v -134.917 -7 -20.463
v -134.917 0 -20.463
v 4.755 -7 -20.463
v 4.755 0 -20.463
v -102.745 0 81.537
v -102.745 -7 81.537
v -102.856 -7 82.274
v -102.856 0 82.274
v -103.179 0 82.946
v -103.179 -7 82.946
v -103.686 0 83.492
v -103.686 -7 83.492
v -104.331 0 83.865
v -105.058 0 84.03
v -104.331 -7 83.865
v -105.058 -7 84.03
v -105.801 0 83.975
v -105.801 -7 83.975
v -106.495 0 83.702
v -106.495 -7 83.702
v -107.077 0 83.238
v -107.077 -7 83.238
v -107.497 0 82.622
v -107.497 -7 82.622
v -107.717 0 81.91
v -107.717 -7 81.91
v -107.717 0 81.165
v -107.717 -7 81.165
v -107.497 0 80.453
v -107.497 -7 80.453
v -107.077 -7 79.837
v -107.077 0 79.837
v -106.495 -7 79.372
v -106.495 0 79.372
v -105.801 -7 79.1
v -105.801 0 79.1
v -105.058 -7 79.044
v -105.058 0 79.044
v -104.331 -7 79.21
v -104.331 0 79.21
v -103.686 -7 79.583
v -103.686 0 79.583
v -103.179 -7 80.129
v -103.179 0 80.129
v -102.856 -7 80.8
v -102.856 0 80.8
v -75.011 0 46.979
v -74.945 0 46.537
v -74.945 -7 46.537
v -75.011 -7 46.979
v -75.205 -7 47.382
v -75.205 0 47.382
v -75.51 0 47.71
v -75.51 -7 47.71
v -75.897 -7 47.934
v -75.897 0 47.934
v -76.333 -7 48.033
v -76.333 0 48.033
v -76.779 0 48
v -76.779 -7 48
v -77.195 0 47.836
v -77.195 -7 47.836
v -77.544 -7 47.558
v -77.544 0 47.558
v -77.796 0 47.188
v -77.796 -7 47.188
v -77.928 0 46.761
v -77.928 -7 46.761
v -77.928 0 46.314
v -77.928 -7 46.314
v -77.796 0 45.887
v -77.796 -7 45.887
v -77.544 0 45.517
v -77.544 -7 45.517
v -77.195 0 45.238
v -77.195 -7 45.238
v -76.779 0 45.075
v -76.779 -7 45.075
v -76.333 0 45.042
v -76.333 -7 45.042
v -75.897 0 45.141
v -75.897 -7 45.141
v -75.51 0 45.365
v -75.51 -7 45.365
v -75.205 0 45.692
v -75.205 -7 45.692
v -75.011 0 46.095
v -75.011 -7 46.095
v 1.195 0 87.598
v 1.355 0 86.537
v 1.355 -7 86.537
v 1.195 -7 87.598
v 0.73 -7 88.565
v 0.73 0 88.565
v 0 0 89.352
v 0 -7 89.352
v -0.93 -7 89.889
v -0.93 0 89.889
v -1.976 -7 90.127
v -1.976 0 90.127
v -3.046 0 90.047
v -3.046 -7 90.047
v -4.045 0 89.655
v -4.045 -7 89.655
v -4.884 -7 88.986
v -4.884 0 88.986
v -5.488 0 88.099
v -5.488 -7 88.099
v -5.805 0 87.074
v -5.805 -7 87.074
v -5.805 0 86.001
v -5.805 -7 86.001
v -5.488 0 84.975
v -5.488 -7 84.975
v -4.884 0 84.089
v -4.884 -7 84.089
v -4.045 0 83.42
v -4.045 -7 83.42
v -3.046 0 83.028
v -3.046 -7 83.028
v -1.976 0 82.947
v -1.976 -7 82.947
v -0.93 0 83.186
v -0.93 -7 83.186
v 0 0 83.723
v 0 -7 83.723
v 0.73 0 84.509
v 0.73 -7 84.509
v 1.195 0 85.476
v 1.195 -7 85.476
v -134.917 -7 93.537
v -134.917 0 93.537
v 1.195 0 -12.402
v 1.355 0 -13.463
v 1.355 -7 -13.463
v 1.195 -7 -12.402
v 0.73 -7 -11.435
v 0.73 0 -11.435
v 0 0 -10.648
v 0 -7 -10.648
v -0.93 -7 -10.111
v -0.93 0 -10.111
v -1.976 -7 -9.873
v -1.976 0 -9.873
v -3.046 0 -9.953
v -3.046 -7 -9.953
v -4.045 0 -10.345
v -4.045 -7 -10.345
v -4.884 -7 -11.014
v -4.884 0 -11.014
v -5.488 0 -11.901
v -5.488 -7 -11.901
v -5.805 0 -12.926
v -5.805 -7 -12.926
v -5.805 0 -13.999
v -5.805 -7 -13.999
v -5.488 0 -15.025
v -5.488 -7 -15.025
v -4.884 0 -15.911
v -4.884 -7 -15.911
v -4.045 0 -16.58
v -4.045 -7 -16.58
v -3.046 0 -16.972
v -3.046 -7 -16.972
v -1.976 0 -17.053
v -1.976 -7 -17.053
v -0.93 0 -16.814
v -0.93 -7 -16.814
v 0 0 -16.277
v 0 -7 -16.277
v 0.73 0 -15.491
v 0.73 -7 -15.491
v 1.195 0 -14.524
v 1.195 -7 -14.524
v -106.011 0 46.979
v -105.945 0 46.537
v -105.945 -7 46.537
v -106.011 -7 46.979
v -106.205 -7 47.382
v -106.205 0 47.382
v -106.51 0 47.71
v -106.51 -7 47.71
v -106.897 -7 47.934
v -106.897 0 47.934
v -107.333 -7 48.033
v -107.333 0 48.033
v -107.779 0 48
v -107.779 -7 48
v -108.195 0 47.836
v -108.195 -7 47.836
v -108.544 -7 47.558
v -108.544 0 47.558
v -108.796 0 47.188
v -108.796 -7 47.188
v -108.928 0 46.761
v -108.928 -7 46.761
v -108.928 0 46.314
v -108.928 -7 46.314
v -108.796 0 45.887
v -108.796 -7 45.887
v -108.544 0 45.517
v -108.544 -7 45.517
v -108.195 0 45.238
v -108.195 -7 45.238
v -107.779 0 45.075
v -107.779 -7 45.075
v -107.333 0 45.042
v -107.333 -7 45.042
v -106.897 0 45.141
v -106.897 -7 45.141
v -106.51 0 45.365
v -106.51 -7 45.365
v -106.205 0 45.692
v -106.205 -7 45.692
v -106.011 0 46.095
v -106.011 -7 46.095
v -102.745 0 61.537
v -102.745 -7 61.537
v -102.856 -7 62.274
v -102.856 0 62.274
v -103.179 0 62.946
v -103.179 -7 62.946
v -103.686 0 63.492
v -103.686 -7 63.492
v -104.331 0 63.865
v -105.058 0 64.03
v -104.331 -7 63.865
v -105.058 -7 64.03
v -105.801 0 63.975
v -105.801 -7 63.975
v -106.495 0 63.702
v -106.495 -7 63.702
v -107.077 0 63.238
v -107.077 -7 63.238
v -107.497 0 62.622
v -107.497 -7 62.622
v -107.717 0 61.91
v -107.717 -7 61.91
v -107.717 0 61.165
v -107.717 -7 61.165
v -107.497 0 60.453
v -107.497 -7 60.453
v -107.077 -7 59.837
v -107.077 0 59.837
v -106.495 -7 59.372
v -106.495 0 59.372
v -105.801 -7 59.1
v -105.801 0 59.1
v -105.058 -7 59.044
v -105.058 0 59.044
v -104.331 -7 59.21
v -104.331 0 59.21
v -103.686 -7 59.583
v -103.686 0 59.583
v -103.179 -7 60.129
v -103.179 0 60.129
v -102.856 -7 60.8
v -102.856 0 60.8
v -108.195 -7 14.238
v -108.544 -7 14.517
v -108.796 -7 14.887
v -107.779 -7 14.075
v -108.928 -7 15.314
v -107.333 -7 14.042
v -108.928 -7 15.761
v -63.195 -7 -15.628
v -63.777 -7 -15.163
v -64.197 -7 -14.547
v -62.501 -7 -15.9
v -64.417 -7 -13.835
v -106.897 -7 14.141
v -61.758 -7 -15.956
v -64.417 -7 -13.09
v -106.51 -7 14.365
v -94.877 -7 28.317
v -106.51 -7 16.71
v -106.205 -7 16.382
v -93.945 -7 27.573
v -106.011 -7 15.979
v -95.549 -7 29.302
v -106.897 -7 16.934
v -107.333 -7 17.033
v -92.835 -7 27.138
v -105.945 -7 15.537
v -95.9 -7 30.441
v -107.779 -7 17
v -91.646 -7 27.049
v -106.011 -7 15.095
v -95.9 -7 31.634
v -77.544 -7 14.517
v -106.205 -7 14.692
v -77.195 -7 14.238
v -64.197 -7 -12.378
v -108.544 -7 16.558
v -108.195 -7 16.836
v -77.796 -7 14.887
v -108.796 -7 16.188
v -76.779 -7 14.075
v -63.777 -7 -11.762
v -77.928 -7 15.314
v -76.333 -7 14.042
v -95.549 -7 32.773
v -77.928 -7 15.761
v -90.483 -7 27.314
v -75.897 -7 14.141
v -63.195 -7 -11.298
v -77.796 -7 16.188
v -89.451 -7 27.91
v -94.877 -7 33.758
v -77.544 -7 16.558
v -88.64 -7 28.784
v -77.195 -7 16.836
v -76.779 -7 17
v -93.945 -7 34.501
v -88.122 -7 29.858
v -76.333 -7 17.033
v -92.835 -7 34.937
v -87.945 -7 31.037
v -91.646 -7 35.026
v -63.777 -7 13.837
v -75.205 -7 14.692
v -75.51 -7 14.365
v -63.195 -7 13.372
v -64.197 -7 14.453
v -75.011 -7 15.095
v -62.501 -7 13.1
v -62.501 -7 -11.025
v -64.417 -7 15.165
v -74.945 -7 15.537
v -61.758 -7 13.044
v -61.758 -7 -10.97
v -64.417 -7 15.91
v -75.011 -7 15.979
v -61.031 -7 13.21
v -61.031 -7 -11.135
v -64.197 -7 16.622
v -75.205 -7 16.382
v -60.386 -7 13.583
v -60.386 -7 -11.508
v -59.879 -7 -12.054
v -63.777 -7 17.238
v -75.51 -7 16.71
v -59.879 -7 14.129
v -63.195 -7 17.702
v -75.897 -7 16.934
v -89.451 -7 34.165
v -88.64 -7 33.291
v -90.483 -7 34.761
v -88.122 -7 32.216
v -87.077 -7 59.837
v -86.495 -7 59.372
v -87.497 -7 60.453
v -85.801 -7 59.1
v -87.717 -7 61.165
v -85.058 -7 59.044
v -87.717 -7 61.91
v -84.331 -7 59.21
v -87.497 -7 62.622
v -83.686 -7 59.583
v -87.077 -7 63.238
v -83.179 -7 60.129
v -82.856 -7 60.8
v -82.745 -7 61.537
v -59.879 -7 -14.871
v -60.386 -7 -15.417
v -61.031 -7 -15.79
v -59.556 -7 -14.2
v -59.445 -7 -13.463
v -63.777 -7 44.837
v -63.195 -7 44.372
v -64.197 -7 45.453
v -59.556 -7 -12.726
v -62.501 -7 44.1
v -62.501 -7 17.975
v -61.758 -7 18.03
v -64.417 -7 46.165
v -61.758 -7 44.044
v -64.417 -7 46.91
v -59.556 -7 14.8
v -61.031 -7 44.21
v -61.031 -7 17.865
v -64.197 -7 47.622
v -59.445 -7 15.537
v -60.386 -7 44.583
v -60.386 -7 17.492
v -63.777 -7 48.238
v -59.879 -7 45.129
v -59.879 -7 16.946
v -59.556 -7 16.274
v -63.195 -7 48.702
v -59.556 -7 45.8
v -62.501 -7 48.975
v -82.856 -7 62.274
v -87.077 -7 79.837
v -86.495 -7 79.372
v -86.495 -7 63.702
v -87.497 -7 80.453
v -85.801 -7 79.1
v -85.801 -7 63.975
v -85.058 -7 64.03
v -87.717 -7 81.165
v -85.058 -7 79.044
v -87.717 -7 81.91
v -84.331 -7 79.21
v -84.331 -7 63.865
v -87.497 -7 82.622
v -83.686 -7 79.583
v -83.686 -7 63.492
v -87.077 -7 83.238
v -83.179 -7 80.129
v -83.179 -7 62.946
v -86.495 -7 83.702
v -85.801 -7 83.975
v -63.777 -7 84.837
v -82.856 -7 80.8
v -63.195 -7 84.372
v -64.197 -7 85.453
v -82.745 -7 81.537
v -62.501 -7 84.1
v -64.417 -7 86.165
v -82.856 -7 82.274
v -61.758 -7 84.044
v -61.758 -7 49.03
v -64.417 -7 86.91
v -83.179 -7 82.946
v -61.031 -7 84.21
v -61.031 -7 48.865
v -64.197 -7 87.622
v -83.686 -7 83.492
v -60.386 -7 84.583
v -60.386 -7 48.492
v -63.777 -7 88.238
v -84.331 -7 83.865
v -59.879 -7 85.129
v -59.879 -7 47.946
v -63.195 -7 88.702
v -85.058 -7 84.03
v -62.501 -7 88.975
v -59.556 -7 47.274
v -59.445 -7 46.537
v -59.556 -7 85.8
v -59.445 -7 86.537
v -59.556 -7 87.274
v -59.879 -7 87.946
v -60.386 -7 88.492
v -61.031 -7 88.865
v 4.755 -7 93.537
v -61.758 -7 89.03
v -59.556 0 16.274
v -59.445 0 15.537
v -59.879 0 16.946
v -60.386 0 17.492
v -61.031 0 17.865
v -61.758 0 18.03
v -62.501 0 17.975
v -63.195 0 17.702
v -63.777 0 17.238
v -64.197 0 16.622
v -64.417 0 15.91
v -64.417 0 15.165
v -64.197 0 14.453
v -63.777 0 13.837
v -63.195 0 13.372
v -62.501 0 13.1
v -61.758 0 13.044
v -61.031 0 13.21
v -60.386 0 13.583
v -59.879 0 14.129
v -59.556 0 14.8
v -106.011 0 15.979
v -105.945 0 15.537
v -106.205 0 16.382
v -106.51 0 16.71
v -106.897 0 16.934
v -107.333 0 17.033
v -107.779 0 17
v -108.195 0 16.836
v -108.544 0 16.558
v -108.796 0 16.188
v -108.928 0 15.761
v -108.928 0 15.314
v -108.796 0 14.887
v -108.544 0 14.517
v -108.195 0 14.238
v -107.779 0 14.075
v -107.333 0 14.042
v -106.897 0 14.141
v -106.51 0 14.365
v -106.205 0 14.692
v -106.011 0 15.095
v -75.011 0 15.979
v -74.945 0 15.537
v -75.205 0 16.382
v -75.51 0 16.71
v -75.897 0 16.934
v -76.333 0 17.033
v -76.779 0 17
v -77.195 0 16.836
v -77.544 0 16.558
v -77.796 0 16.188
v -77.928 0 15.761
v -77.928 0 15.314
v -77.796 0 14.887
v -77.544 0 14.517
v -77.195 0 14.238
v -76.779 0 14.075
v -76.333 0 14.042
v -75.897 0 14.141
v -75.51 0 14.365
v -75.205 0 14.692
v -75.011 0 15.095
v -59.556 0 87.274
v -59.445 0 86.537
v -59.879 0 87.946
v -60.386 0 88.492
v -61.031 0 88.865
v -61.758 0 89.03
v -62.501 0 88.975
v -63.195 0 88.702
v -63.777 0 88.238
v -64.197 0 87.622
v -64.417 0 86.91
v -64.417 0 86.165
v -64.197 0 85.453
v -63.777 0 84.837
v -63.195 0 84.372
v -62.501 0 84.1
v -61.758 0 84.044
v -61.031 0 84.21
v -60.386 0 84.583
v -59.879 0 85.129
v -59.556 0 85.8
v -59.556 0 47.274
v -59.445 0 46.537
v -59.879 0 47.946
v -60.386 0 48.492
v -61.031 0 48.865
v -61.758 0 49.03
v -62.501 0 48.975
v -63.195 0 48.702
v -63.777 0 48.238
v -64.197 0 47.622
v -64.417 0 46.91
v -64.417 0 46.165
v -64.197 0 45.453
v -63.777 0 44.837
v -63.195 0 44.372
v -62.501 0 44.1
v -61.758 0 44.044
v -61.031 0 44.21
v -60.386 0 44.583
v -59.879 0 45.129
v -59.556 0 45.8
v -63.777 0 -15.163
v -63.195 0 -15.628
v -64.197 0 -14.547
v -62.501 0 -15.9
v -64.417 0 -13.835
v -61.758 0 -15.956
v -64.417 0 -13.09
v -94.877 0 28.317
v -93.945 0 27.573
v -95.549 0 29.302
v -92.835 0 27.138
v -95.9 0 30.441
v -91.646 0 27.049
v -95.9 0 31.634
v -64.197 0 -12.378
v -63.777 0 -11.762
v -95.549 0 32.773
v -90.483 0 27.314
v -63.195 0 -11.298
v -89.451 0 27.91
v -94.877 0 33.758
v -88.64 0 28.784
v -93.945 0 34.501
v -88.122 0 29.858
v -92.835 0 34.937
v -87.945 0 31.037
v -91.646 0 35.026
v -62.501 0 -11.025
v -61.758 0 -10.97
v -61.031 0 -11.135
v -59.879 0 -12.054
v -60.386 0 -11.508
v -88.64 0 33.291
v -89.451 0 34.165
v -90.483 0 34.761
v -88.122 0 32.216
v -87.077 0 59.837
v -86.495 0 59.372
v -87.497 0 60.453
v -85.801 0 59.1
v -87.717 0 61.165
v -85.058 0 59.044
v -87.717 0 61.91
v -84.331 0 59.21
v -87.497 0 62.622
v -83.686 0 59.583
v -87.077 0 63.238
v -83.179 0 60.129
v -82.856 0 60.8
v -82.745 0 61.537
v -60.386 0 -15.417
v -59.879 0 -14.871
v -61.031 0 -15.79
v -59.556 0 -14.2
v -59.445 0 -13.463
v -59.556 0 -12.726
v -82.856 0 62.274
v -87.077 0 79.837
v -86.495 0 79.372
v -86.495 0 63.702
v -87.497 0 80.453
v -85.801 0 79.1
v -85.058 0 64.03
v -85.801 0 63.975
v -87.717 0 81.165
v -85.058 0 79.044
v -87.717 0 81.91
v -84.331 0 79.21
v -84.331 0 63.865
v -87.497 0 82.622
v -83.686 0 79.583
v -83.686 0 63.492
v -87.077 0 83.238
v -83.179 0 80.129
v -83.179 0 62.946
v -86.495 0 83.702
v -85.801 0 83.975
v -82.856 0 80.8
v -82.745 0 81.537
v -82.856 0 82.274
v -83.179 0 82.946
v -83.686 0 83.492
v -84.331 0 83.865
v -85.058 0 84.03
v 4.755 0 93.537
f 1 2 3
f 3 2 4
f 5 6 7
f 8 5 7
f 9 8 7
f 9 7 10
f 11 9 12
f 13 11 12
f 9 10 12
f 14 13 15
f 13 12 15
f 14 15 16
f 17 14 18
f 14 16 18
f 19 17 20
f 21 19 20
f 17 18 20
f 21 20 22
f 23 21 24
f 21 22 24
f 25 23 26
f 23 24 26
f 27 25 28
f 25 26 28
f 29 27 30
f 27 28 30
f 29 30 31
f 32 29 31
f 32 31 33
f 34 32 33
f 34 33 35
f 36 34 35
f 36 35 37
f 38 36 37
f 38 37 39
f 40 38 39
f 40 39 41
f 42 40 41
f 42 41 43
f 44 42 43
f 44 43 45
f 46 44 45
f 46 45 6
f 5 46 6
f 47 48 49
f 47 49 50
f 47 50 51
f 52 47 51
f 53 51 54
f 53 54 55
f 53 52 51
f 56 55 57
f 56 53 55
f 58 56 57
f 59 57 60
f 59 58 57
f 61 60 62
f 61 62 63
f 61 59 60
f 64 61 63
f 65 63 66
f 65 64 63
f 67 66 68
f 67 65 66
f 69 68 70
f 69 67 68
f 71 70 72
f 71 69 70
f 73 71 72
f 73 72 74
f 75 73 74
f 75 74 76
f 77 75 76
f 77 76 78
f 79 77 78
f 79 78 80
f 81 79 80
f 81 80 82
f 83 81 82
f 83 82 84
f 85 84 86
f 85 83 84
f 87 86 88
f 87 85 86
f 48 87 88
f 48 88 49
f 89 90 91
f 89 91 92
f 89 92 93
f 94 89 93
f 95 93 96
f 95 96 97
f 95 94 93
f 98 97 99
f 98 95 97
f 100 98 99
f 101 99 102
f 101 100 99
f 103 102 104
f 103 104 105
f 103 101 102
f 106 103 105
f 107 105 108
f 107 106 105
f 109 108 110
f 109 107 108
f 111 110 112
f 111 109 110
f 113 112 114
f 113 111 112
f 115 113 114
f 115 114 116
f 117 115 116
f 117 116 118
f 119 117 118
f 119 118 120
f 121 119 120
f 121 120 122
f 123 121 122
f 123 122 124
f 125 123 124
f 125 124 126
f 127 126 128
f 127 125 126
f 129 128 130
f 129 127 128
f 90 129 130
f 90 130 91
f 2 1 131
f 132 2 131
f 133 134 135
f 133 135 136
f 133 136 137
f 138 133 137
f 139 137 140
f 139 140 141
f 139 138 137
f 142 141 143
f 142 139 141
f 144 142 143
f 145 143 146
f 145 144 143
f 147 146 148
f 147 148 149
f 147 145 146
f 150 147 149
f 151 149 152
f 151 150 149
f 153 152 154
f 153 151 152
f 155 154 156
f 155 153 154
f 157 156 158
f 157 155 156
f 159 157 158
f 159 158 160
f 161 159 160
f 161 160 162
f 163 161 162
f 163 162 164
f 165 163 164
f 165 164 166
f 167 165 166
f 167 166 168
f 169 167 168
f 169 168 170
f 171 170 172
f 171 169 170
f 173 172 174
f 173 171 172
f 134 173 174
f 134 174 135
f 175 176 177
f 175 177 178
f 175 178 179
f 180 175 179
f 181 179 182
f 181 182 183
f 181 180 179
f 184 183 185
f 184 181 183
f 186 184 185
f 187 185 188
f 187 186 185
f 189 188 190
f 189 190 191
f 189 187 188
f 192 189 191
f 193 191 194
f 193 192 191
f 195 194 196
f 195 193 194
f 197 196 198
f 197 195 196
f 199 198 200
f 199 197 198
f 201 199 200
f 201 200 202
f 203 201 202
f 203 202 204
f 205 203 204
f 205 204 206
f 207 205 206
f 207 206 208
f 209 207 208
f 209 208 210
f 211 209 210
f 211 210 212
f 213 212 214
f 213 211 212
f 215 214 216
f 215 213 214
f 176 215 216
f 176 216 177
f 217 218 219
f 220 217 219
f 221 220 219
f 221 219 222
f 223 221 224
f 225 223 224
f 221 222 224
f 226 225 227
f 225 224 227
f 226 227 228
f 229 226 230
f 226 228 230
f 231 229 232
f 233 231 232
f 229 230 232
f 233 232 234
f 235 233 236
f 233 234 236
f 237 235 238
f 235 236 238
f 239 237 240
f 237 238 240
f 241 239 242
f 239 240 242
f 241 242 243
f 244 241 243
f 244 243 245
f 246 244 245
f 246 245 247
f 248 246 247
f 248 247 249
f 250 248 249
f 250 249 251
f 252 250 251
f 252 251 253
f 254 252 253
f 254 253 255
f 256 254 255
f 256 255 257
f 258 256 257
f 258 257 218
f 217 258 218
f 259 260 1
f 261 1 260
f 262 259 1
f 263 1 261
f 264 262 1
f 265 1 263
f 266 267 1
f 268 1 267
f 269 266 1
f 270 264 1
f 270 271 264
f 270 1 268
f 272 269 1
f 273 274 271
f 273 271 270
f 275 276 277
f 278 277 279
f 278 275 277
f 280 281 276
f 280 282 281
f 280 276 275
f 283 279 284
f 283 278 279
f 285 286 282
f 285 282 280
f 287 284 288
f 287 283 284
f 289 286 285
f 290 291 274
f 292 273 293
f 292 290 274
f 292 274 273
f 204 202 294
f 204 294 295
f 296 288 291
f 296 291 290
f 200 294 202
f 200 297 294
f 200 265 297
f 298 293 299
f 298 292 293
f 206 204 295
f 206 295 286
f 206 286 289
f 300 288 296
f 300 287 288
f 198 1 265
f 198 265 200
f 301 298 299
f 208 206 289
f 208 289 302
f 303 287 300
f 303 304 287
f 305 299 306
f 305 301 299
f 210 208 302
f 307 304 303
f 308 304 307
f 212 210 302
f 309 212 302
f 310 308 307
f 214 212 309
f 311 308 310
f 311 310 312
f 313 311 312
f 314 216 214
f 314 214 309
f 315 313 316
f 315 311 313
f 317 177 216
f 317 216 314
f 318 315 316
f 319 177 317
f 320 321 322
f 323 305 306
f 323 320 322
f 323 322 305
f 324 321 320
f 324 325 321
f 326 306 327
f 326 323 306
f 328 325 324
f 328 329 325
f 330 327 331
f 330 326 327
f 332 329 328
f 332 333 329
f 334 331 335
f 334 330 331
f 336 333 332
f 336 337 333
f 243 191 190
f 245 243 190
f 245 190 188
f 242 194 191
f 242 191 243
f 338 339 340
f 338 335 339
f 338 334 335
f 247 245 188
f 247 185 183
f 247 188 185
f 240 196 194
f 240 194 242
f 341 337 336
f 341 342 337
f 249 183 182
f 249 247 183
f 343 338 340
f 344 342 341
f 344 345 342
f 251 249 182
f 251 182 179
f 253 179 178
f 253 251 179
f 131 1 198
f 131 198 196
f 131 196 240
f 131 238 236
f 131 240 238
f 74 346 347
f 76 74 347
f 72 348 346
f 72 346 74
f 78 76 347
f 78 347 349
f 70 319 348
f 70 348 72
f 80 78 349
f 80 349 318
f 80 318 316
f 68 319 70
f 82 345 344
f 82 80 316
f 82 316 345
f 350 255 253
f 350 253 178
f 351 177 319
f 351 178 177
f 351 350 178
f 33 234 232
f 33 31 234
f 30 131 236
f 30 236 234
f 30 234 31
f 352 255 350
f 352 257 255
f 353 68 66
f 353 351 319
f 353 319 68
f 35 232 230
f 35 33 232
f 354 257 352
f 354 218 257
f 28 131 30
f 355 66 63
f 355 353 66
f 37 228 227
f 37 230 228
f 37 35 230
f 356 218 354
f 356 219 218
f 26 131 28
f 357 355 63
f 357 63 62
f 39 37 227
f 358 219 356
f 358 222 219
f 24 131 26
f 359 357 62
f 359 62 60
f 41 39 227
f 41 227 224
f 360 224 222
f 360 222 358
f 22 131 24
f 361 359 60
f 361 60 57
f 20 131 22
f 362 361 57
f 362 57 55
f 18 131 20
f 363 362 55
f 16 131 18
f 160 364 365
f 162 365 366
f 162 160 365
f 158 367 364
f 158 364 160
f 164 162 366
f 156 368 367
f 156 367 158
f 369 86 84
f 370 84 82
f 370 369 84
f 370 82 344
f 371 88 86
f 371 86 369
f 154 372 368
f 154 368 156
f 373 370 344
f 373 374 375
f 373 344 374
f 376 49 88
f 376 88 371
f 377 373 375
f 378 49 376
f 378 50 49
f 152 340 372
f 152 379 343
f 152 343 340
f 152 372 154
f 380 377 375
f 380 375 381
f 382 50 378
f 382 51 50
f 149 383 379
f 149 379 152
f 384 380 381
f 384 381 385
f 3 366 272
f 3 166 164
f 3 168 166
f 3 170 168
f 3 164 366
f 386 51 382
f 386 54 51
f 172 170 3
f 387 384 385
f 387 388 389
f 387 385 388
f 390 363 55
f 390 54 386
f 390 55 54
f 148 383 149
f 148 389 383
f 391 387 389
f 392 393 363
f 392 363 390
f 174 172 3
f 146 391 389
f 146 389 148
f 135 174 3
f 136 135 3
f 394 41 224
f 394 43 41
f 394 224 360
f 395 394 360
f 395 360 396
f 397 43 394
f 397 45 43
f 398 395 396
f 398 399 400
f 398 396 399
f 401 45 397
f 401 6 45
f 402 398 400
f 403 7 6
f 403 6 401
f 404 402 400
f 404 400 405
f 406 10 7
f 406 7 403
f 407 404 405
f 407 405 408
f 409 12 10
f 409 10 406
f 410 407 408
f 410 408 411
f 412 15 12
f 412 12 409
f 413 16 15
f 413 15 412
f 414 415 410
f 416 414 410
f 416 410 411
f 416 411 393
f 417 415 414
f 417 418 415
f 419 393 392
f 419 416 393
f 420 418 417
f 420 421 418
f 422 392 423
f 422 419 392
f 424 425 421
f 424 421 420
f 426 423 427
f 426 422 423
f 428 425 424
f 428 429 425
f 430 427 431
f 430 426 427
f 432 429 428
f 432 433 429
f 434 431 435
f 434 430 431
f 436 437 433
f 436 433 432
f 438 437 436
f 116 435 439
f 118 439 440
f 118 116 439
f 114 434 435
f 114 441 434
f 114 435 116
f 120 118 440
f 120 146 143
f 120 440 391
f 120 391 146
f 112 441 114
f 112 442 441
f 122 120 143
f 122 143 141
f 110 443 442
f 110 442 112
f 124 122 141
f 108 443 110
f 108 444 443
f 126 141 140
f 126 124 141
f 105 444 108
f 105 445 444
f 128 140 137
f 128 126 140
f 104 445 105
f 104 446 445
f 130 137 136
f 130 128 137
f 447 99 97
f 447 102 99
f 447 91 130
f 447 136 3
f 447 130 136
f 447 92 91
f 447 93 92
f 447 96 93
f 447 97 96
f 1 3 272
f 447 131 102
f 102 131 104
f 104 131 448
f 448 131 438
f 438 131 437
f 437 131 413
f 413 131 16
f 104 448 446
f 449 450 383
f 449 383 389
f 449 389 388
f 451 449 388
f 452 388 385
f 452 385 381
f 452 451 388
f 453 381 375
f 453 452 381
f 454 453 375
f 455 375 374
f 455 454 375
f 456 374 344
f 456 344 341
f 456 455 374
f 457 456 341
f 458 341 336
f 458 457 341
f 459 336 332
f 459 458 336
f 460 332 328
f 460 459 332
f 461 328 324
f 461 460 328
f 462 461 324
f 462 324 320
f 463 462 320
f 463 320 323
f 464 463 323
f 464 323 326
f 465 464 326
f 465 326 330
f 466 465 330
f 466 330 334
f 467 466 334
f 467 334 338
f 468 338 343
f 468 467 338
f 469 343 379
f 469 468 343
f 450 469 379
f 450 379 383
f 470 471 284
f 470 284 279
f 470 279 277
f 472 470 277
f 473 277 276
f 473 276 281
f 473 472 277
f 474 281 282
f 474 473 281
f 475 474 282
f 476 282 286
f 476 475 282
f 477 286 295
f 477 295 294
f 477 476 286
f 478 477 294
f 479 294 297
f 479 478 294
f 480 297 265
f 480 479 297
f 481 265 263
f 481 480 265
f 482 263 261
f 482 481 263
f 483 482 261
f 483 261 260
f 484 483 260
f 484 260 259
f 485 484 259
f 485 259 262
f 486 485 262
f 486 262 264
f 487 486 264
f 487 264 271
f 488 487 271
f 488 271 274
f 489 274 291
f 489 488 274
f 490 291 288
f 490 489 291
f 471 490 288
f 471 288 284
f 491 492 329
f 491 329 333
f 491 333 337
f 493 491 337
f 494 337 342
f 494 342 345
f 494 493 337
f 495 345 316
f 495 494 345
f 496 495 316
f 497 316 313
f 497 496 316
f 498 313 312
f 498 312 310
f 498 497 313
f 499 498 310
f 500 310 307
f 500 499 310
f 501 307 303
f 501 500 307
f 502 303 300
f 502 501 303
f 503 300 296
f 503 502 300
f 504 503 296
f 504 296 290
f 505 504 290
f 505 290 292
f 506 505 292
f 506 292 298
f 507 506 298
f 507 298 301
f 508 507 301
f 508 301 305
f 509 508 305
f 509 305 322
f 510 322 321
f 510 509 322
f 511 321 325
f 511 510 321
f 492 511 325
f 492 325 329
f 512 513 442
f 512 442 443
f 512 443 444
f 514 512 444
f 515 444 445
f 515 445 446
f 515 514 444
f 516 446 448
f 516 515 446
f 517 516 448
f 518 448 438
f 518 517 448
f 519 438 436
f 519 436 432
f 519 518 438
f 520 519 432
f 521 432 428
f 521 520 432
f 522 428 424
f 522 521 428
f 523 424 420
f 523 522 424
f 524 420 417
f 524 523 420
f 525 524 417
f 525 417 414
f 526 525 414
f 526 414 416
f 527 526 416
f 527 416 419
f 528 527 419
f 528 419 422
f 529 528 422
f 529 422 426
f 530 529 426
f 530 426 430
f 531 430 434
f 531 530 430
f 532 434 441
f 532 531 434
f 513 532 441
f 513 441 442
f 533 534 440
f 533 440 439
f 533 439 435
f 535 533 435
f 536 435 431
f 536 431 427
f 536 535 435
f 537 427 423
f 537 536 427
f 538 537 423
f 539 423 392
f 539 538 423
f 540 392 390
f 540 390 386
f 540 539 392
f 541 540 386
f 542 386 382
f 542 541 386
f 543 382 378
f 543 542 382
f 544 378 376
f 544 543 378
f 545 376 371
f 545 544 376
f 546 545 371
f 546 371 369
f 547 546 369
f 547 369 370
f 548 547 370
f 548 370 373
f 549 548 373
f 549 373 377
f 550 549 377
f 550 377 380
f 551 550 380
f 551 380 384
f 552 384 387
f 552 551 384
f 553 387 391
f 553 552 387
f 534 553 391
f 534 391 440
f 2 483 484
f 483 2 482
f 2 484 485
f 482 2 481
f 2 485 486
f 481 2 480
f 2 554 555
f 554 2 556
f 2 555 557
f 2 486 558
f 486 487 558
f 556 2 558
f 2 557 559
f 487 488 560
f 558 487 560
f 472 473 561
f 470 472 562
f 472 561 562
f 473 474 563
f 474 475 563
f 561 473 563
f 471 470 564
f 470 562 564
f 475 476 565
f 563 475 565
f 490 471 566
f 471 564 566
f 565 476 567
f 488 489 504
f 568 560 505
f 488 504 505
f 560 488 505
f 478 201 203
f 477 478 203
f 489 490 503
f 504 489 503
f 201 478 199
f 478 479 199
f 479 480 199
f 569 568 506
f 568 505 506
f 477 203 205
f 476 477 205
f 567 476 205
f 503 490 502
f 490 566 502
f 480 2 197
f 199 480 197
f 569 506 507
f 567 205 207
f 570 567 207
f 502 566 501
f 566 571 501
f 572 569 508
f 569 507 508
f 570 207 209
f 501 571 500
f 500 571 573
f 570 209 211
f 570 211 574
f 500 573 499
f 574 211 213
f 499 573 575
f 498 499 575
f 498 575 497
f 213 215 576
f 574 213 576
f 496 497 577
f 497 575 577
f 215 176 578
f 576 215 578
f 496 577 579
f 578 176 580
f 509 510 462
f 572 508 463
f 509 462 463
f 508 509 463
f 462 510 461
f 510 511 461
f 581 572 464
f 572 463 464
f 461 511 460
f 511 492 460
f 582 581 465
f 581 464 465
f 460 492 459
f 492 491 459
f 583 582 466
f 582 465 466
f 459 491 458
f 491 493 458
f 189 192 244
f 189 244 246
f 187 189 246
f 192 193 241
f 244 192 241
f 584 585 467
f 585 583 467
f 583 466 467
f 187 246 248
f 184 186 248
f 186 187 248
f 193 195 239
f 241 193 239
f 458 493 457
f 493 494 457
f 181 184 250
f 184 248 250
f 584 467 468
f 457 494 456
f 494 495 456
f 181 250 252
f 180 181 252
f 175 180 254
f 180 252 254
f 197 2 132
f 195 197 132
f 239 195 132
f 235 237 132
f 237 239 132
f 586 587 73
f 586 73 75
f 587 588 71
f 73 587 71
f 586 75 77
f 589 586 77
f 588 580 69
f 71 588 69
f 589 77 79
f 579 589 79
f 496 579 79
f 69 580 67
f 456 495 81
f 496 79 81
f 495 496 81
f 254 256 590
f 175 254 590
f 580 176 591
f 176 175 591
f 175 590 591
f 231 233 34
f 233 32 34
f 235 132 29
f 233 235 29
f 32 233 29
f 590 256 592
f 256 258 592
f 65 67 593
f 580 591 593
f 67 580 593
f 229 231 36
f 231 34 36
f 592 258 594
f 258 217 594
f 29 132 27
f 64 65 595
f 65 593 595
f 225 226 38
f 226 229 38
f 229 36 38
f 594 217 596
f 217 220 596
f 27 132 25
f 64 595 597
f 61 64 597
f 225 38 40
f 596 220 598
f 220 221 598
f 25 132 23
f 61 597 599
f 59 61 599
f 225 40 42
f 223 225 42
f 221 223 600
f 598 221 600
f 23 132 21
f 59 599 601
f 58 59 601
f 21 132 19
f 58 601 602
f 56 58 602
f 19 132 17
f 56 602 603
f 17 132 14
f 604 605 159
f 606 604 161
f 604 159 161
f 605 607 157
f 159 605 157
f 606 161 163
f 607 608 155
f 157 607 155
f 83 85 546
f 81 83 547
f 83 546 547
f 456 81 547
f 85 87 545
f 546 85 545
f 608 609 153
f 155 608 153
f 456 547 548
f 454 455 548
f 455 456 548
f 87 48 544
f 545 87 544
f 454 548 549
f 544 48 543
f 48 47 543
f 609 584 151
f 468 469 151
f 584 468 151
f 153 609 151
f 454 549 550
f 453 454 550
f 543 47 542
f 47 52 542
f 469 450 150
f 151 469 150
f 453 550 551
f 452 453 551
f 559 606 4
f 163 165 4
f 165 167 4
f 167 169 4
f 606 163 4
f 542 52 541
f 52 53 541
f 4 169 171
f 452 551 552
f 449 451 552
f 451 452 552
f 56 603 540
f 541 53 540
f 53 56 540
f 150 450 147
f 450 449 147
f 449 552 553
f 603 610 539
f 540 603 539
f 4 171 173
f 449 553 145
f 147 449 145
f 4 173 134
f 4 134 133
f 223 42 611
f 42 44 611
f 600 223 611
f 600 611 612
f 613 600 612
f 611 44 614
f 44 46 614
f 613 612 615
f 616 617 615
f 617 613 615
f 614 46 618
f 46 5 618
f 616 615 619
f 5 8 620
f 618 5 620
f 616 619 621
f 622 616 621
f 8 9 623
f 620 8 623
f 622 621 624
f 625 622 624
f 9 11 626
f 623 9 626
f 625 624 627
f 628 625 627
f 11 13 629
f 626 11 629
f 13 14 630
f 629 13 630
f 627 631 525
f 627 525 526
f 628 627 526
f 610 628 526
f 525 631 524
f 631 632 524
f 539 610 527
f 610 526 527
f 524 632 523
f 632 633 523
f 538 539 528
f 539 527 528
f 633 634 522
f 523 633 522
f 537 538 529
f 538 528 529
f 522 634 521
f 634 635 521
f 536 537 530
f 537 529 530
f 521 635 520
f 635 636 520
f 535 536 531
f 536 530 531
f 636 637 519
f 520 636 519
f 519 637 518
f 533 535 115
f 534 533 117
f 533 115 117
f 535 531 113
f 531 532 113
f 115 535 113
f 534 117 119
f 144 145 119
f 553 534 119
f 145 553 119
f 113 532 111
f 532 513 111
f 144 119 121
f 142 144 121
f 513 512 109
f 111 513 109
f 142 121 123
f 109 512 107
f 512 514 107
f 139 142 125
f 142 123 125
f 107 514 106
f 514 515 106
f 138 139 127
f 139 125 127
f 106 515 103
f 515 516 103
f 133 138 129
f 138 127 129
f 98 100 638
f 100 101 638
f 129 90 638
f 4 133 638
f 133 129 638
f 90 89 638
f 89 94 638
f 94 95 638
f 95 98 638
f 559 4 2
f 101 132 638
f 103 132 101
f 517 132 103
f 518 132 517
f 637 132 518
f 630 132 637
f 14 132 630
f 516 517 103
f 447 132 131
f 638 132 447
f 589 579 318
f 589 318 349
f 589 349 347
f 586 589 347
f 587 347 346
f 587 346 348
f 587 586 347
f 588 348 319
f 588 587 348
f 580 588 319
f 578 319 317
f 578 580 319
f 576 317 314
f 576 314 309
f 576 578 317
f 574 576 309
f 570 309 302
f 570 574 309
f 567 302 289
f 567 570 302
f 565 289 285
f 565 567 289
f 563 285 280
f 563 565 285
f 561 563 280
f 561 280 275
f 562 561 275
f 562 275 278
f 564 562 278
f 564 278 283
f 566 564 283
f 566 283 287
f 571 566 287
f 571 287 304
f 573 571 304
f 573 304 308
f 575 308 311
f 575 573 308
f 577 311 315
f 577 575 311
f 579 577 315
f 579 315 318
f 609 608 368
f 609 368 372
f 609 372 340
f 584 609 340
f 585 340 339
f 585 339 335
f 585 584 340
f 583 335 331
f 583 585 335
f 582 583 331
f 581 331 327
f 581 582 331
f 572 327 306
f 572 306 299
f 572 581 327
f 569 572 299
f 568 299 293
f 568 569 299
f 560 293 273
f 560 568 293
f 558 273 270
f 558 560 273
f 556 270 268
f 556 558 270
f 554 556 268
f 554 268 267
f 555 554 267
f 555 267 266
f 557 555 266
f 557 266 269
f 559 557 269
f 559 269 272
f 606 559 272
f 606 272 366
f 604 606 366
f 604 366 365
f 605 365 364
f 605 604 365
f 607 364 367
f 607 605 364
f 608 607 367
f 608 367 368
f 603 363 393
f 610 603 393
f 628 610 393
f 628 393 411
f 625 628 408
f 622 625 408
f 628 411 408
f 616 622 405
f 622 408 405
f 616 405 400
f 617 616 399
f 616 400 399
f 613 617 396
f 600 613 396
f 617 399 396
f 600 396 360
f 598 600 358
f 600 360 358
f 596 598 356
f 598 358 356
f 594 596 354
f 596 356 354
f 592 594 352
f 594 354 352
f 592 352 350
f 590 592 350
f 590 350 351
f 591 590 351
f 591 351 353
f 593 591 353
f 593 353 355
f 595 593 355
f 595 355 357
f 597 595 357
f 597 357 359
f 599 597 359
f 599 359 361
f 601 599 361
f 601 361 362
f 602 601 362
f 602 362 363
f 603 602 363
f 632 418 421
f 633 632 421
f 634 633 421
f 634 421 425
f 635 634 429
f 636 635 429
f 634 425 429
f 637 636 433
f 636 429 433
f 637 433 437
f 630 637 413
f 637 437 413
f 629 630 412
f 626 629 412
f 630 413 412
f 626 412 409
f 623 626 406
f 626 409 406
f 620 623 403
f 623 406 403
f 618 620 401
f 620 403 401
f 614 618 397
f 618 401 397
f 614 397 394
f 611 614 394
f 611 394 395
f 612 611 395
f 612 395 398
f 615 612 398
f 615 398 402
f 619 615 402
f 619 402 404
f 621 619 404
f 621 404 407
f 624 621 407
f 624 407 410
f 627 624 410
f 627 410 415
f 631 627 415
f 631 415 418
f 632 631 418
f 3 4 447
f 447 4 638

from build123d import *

# Parameters (mm, degrees)
F0_W     = 156.7
F0_H     = 114
F0_R     = 1.5
F0_R_2   = 11
F0_R_3   = 2.5
F0_R_4   = 3.6
F0_R_5   = 4
F1_DEPTH = 7
F2_R     = 2.5
F2_W     = 17.027749
F2_H     = 114
F3_DEPTH = 25


with BuildPart() as f1:
    # F0 (on Front) → F1 (new body)
    with BuildSketch(Plane.XZ):
        with Locations((-73.594777, 36.537357)):
            Rectangle(F0_W, F0_H)
        with Locations((-107.444777, 15.537357)):
            Circle(F0_R, mode=Mode.SUBTRACT)
        with Locations((-76.444777, 15.537357)):
            Circle(F0_R, mode=Mode.SUBTRACT)
        with Locations((-91.944777, 31.037357)):
            Circle(F0_R_2, mode=Mode.SUBTRACT)
        with Locations((-61.944777, -13.462643)):
            Circle(F0_R_3, mode=Mode.SUBTRACT)
        with Locations((-2.244777, -13.462643)):
            Circle(F0_R_4, mode=Mode.SUBTRACT)
        with Locations((-61.944777, 15.537357)):
            Circle(F0_R_3, mode=Mode.SUBTRACT)
        with Locations((-107.444777, 46.537357)):
            Circle(F0_R, mode=Mode.SUBTRACT)
        with Locations((-76.444777, 46.537357)):
            Circle(F0_R, mode=Mode.SUBTRACT)
        with Locations((-61.944777, 46.537357)):
            Circle(F0_R_3, mode=Mode.SUBTRACT)
        with Locations((-61.944777, 86.537357)):
            Circle(F0_R_3, mode=Mode.SUBTRACT)
        with Locations((-2.244777, 86.537357)):
            Circle(F0_R_4, mode=Mode.SUBTRACT)
        with Locations((-91.944777, 31.037357)):
            Circle(F0_R_2)
        with Locations((-91.944777, 31.037357)):
            Circle(F0_R_5, mode=Mode.SUBTRACT)
    extrude(amount=F1_DEPTH)

    # F2 (on face) → F3 (cut)
    with BuildSketch(Plane.XZ.offset(7)):
        with Locations((-105.244777, 81.537357)):
            Circle(F2_R)
        with Locations((-105.244777, 61.537357)):
            Circle(F2_R)
        with Locations((-85.244777, 61.537357)):
            Circle(F2_R)
        with Locations((-85.244777, 81.537357)):
            Circle(F2_R)
        with Locations((-143.430903, 36.537357)):
            Rectangle(F2_W, F2_H)
    extrude(amount=-F3_DEPTH, mode=Mode.SUBTRACT)


solid = f1.part
